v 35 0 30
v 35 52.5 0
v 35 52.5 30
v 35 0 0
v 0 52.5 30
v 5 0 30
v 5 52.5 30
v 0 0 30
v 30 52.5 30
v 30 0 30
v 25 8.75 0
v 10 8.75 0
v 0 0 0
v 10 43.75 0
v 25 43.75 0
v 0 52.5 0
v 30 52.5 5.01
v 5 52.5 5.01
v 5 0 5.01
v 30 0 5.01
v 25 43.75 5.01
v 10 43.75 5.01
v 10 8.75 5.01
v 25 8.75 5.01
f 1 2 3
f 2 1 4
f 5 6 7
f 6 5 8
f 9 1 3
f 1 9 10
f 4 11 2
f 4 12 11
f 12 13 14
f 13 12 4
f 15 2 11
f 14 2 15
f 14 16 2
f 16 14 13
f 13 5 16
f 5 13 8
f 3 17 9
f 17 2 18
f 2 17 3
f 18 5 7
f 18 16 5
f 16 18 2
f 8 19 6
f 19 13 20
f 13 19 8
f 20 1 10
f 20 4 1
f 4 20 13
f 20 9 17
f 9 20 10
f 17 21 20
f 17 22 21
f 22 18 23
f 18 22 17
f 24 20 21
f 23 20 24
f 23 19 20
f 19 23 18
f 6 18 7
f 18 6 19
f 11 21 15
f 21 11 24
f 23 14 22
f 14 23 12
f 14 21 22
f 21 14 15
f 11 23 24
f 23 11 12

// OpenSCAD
// file: ../modules/fillet.scad
module fillet(r, l) {
  difference() {
    cube([r, r, l]);
    translate([0, 0, -.1]) cylinder(h = l + .2, r = r);
  }
}
// main file
include <../modules/fillet.scad>

$fa=4; // default minimum facet angle is now 0.5
$fs=0.05; // default minimum facet size is now 0.05 mm

spongeThickness = 25;
spongeWidth = 70;

holderDepth = 25;

wallThickness = 5;

difference() {
  cube([spongeThickness + wallThickness * 2, spongeWidth * .75, holderDepth + wallThickness]);
  translate([wallThickness, -spongeWidth * .125, wallThickness + 0.01]) cube([spongeThickness, spongeWidth, holderDepth]);
  translate([wallThickness * 2, spongeWidth * .125, -0.01]) cube([spongeThickness - wallThickness * 2, spongeWidth / 2, wallThickness + 0.03]);
}
